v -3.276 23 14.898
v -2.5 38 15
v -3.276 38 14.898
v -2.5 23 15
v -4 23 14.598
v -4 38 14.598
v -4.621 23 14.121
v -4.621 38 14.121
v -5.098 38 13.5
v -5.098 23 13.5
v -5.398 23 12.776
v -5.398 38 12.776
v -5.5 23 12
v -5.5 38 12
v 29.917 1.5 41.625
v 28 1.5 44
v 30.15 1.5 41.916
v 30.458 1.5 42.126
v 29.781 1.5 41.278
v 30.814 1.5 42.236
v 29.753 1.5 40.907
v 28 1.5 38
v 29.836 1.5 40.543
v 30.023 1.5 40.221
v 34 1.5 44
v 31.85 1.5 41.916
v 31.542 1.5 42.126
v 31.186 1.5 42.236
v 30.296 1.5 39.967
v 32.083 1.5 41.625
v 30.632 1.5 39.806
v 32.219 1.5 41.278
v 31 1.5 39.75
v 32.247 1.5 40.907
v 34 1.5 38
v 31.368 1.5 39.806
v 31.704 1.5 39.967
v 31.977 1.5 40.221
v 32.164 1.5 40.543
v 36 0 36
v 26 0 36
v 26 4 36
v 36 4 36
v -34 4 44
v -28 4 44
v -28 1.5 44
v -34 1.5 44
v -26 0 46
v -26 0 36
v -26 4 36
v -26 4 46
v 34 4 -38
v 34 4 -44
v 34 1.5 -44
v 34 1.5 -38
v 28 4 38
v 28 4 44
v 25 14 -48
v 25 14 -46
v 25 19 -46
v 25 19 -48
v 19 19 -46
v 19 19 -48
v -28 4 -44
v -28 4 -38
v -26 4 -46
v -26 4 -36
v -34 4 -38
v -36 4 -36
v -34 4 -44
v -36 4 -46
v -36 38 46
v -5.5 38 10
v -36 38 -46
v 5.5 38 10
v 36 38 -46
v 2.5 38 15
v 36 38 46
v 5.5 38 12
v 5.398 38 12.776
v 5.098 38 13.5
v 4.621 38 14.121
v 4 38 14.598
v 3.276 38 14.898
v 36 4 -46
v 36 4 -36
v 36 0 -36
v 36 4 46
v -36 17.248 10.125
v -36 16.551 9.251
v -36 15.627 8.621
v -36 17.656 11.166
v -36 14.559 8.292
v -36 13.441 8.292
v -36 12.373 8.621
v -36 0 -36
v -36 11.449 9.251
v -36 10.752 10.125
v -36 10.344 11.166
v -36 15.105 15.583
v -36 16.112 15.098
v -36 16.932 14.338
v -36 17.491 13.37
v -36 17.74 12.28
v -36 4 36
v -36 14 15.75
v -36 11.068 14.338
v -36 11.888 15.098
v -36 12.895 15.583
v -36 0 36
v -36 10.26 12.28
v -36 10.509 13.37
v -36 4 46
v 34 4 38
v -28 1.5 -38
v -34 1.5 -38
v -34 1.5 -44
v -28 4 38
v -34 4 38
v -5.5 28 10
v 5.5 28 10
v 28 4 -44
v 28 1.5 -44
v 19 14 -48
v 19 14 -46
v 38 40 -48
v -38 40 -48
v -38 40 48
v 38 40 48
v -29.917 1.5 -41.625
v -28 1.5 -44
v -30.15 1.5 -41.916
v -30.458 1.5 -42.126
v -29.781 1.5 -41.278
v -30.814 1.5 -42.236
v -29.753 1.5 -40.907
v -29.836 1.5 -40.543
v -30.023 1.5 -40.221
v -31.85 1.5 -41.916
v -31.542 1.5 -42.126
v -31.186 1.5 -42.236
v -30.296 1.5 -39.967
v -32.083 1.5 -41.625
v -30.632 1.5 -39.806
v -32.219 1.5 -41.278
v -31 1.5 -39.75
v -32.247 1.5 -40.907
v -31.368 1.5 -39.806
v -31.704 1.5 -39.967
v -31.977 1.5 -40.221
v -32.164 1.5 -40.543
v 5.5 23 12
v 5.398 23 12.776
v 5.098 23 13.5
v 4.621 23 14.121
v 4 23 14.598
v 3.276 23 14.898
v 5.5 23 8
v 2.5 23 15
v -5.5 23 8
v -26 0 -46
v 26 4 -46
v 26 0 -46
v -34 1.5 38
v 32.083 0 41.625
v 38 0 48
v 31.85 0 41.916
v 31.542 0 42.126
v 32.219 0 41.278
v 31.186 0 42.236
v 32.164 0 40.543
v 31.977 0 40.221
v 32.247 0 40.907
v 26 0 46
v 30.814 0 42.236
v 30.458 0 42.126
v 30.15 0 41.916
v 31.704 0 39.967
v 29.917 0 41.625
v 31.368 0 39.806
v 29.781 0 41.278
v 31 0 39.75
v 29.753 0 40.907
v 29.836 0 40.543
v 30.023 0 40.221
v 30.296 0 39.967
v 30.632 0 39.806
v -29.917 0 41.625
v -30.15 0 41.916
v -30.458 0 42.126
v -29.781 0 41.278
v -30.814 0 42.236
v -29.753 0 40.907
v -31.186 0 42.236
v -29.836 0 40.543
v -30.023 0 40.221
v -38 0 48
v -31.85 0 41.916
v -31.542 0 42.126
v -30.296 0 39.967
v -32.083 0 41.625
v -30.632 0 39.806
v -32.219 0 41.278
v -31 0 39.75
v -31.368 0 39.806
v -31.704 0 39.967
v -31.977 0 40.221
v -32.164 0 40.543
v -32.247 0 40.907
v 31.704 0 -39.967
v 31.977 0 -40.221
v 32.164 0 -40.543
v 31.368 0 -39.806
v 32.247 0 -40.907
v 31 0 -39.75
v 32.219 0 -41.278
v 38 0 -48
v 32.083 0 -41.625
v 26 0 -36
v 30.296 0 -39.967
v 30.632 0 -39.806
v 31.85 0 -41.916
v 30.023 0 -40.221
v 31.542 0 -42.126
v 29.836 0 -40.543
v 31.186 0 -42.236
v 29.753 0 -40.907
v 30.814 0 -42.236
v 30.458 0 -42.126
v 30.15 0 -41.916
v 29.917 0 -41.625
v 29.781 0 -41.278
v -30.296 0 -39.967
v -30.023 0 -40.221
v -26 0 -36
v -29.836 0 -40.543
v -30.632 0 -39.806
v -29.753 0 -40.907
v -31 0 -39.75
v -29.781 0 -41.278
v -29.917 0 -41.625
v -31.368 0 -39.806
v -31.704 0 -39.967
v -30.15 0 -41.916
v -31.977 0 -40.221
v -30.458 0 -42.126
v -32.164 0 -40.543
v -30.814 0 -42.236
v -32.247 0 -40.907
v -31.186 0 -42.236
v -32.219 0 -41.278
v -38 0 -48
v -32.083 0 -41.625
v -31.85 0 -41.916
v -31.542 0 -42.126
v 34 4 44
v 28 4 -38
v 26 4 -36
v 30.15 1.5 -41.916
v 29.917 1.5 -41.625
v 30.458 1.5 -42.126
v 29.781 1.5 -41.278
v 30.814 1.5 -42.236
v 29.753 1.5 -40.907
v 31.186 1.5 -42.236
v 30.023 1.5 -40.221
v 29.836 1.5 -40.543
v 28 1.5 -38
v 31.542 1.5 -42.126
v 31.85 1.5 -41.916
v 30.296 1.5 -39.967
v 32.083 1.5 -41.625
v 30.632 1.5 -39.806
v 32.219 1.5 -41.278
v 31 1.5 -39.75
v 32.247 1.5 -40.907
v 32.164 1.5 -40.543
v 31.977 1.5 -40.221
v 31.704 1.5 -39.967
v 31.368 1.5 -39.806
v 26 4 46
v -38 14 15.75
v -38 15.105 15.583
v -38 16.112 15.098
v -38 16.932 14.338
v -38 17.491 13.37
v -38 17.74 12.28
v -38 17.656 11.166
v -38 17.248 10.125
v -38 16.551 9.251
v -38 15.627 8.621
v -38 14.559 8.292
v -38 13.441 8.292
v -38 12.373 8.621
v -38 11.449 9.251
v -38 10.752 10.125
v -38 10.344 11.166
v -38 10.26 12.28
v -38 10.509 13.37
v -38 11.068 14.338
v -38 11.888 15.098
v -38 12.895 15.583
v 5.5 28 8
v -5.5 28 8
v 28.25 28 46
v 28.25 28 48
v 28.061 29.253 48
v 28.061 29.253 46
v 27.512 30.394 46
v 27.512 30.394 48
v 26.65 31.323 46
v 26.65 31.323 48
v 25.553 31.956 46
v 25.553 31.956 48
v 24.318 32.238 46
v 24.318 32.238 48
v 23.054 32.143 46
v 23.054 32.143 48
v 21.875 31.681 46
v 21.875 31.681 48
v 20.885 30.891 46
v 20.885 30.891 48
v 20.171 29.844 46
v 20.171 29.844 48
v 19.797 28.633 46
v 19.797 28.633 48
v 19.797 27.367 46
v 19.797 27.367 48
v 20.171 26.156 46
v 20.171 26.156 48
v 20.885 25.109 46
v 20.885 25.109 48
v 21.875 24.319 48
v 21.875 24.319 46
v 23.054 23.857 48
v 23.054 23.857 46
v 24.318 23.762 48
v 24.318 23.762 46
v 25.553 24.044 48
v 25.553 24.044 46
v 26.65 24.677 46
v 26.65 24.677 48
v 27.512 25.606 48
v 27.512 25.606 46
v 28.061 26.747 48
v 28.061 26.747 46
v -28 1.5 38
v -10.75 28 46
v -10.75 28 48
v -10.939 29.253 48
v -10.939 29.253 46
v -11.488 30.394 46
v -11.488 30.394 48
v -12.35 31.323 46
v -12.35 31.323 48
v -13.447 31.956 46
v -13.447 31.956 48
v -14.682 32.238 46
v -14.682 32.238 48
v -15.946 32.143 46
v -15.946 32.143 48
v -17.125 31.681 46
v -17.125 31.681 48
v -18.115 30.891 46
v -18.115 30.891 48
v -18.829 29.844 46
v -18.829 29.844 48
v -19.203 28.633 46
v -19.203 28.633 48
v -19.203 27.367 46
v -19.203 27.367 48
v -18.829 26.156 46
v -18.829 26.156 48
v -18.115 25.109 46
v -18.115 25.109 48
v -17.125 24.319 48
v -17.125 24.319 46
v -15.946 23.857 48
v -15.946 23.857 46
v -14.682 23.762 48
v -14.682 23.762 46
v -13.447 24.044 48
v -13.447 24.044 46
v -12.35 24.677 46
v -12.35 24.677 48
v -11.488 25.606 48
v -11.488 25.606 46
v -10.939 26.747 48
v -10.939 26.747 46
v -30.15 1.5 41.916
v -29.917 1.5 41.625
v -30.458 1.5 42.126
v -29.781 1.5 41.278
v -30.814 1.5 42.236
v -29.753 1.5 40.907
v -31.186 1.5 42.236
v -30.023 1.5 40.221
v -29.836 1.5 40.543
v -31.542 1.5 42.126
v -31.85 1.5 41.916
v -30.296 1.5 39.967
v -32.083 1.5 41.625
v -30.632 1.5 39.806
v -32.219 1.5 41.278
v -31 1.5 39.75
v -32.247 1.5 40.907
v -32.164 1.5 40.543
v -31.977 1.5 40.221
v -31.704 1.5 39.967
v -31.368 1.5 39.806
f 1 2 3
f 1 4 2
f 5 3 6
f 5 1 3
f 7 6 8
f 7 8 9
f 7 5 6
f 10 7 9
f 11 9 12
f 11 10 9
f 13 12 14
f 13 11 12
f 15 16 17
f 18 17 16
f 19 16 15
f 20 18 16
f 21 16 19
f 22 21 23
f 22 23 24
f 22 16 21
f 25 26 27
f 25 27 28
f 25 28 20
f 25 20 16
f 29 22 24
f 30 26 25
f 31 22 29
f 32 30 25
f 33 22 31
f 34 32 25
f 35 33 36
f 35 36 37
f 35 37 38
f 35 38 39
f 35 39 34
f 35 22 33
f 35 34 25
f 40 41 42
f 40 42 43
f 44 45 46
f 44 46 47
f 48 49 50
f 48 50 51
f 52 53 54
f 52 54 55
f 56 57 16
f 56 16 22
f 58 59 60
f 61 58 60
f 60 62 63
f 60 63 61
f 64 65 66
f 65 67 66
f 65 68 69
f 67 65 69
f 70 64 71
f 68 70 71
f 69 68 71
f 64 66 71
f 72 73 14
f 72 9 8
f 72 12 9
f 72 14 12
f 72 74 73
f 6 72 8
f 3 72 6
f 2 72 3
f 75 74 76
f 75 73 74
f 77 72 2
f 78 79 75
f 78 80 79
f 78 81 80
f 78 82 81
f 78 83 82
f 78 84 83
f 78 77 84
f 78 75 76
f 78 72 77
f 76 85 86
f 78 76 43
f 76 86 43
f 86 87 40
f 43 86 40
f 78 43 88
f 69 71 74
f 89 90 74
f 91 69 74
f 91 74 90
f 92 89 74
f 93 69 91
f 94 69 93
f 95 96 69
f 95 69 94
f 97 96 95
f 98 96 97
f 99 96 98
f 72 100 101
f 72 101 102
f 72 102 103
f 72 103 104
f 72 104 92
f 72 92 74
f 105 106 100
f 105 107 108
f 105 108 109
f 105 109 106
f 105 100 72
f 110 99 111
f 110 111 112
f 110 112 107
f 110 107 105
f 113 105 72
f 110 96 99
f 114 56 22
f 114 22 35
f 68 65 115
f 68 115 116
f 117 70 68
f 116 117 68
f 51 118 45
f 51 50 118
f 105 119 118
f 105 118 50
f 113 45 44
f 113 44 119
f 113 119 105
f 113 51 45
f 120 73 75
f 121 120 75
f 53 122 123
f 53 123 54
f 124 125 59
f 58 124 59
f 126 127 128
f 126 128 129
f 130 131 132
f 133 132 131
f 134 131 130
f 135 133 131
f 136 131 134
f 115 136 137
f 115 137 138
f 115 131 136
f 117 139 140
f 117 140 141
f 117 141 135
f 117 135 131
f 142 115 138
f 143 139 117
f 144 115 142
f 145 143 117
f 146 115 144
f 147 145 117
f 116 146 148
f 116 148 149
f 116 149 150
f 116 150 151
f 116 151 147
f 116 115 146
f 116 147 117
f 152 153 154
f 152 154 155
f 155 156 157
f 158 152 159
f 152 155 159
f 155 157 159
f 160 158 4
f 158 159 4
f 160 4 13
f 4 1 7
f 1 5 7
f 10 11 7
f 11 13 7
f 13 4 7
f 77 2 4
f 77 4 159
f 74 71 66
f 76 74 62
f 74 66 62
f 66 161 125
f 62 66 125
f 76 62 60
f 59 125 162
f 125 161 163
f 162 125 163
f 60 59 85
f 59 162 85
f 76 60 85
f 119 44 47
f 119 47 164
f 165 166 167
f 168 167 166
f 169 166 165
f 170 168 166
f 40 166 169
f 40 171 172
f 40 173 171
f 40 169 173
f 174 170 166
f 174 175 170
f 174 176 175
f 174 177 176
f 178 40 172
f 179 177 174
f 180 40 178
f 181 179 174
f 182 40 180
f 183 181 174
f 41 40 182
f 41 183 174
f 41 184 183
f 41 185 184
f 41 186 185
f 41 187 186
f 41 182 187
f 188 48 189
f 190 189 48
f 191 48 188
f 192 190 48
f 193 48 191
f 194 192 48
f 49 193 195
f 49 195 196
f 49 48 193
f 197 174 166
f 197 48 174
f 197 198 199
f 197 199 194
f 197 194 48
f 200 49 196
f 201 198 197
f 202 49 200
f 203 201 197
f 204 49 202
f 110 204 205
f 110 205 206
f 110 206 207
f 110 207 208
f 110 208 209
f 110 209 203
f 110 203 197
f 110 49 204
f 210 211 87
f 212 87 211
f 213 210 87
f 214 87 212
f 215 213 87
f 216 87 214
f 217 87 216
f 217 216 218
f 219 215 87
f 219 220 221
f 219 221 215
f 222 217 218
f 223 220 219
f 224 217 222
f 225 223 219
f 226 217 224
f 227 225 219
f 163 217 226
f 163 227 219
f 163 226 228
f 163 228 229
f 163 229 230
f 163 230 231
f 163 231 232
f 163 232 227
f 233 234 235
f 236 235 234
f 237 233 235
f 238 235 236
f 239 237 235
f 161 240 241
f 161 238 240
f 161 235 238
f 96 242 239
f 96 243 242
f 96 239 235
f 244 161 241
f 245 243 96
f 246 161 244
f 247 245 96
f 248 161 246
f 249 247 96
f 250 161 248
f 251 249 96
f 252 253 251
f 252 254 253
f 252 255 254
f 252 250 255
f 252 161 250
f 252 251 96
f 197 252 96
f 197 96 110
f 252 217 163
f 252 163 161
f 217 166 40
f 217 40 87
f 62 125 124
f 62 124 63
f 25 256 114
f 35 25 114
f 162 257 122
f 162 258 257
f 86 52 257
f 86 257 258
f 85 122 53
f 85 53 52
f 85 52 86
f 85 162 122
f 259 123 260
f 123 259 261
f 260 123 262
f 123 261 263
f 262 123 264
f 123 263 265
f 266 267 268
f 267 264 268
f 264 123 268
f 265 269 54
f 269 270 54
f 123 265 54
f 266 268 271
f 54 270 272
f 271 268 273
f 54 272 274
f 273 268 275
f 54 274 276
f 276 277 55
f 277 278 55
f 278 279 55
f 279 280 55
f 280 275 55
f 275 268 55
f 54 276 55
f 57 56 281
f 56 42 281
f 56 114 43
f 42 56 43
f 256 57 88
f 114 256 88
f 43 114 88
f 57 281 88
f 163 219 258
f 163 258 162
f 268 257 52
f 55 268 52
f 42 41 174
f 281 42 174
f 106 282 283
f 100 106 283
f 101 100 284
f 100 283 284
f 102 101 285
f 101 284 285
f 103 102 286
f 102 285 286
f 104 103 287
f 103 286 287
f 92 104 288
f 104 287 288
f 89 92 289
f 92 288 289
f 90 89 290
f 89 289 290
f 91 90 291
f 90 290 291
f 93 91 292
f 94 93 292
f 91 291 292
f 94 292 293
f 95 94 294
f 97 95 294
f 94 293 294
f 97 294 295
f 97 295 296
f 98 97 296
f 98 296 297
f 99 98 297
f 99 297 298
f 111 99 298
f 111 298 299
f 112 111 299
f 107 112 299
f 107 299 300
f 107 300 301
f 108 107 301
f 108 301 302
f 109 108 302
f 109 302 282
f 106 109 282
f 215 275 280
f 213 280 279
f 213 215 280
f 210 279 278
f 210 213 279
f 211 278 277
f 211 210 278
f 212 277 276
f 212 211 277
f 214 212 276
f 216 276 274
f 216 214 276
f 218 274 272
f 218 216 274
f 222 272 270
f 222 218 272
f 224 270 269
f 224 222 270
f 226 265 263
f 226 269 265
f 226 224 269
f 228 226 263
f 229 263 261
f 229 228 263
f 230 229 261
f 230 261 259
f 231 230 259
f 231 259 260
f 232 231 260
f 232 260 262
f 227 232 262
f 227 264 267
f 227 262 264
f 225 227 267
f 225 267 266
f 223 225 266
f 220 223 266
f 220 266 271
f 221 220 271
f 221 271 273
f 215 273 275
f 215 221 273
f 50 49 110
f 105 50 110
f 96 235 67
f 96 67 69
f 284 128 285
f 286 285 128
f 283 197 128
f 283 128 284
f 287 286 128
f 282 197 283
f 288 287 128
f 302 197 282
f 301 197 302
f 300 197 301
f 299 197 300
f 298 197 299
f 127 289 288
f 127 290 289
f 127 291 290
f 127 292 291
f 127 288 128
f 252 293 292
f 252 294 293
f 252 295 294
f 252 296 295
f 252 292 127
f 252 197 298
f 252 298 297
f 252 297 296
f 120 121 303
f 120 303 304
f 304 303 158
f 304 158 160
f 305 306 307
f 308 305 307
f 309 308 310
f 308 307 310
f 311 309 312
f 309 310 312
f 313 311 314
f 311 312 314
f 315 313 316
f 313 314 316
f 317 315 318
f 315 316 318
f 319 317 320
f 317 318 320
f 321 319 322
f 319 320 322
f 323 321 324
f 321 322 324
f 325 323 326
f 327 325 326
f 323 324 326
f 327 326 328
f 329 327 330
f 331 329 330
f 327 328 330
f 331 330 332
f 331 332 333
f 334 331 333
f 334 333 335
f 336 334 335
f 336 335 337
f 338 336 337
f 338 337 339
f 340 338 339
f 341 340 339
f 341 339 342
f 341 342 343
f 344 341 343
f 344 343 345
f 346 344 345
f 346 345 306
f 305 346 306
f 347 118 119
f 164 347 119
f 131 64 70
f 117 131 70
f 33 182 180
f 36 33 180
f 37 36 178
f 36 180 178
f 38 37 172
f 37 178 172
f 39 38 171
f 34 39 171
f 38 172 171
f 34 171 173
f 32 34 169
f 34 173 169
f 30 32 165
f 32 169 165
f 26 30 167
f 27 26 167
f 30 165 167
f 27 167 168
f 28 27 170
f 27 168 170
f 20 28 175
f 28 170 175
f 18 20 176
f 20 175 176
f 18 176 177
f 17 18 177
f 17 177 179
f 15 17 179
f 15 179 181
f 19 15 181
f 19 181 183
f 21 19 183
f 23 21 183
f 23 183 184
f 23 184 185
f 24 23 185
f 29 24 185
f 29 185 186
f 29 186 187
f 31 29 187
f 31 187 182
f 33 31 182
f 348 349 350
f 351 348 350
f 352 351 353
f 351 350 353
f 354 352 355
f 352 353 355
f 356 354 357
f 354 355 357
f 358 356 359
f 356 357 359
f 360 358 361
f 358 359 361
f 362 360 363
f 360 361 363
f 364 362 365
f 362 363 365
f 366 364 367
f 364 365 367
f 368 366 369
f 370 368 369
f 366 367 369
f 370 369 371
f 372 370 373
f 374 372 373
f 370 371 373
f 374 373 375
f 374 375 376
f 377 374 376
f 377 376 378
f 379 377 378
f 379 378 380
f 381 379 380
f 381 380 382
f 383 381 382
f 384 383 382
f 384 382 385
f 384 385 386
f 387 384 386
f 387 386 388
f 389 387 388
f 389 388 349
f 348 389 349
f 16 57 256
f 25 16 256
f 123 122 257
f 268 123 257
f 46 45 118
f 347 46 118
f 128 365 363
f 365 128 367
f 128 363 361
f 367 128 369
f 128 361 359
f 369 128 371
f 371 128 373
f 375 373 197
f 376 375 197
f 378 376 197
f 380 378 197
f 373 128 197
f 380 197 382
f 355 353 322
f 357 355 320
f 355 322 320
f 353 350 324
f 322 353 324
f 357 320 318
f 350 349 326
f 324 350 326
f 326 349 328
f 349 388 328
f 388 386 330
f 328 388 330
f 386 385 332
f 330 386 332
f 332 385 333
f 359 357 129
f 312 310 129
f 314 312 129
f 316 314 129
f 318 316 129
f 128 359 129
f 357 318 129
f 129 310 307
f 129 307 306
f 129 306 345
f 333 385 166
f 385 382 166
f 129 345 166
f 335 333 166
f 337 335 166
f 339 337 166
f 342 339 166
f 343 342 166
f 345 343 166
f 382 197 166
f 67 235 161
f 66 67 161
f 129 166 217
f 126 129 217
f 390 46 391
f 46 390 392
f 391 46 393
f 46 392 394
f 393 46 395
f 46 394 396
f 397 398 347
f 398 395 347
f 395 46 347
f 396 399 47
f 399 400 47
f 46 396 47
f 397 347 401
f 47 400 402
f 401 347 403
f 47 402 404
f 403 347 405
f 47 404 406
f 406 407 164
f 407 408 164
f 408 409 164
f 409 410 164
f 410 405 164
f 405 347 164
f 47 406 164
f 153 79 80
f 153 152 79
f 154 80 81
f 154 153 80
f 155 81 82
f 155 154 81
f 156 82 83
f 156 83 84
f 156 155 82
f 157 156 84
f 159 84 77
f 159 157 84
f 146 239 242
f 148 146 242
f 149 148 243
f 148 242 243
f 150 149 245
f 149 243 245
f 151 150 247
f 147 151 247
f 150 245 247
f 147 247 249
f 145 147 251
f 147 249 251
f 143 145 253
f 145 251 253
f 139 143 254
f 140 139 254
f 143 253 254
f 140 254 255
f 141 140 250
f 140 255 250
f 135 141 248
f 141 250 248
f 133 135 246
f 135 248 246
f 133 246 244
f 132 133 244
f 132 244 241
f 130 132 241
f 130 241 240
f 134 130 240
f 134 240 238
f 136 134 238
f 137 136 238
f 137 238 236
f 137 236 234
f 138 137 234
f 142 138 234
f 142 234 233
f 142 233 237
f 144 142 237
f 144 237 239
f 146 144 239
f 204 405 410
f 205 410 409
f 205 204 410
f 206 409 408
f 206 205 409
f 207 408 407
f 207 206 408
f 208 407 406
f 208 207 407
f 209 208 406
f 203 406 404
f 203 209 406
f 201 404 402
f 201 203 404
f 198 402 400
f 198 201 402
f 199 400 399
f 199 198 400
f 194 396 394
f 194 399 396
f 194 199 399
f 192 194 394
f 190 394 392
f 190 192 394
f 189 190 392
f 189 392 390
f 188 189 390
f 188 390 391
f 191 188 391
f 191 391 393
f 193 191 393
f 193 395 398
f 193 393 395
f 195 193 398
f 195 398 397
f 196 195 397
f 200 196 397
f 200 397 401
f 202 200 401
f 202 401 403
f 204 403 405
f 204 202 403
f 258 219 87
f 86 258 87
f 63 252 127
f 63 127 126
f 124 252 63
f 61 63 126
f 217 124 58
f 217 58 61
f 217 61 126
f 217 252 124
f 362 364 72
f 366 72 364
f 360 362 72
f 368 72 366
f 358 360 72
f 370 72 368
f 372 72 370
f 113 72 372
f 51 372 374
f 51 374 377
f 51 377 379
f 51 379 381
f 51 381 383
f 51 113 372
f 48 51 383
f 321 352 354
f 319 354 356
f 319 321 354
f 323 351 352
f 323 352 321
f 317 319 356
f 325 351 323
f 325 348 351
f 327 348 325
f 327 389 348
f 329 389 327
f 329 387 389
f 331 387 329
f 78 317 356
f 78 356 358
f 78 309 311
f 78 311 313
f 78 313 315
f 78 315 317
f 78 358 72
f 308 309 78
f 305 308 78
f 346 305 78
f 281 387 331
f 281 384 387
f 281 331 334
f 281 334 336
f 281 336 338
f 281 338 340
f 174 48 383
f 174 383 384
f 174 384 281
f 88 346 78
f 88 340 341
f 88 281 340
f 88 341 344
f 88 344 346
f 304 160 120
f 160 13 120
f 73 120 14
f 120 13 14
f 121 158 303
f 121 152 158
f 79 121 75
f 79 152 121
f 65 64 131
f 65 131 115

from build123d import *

# Parameters (mm, degrees)
SKETCH1_W               = 76
SKETCH1_H               = 96
BOSS_EXTRUDE1_DEPTH     = 40
SKETCH2_W               = 72
SKETCH2_H               = 92
CUT_EXTRUDE3_DEPTH      = 38
CUT_EXTRUDE4_REACH      = 112.725
SKETCH7_R               = 4.25
SKETCH10_W              = 11
SKETCH10_H              = 5
BOSS_EXTRUDE2_DEPTH     = 15
FILLET2_R               = 3
CUT_EXTRUDE5_REACH      = 110.995
SKETCH11_W              = 6
SKETCH11_H              = 5
SKETCH12_W              = 11
SKETCH12_H              = 5
BOSS_EXTRUDE3_DEPTH     = 2
CUT_EXTRUDE6_REACH      = 100.387
SKETCH13_R              = 3.75
SKETCH15_W              = 10
SKETCH15_H              = 10
SKETCH15_R              = 1.25
BOSS_EXTRUDE4_DEPTH     = 4
MIRROR2_COPY_1_SKETCH_W = 10
MIRROR2_COPY_1_SKETCH_H = 10
MIRROR2_COPY_1_SKETCH_R = 1.25
MIRROR2_COPY_1_DEPTH    = 4
SKETCH17_W              = 6
SKETCH17_H              = 6
CUT_EXTRUDE7_DEPTH      = 2.5
MIRROR4_COPY_1_SKETCH_W = 6
MIRROR4_COPY_1_SKETCH_H = 6
MIRROR4_COPY_1_DEPTH    = 2.5


with BuildPart() as part:
    # Sketch1 → Boss-Extrude1 (new body)
    with BuildSketch(Plane(origin=(0, 0, 0), x_dir=(1, 0, 0), z_dir=(0, 1, 0))):
        Rectangle(SKETCH1_W, SKETCH1_H)
    extrude(amount=BOSS_EXTRUDE1_DEPTH)

    # Sketch2 → Cut-Extrude3 (cut)
    with BuildSketch(Plane.XZ):
        Rectangle(SKETCH2_W, SKETCH2_H)
    extrude(amount=-CUT_EXTRUDE3_DEPTH, mode=Mode.SUBTRACT)

    # Sketch7 → Cut-Extrude4 (cut, up to next)
    with BuildSketch(Plane.XY.offset(48), mode=Mode.PRIVATE) as cut_extrude4_sk1:
        with Locations((-15, 28)):
            Circle(SKETCH7_R)
    cut_extrude4_tool1 = extrude(cut_extrude4_sk1.sketch, amount=-CUT_EXTRUDE4_REACH, mode=Mode.PRIVATE) & part.part
    # Sketch7 → Cut-Extrude4 (cut, up to next)
    with BuildSketch(Plane.XY.offset(48), mode=Mode.PRIVATE) as cut_extrude4_sk2:
        with Locations((24, 28)):
            Circle(SKETCH7_R)
    cut_extrude4_tool2 = extrude(cut_extrude4_sk2.sketch, amount=-CUT_EXTRUDE4_REACH, mode=Mode.PRIVATE) & part.part
    add(cut_extrude4_tool1.solids().sort_by_distance((-15, 28, 48))[0], mode=Mode.SUBTRACT)
    add(cut_extrude4_tool2.solids().sort_by_distance((24, 28, 48))[0], mode=Mode.SUBTRACT)

    # Sketch10 → Boss-Extrude2 (add)
    with BuildSketch(Plane.XZ.offset(-38)):
        with Locations((0, 12.5)):
            Rectangle(SKETCH10_W, SKETCH10_H)
    extrude(amount=BOSS_EXTRUDE2_DEPTH)

    # Fillet2
    fillet2_edges = [part.edges().sort_by_distance(p)[0] for p in [
        (5.5, 30.5, 15),
        (-5.5, 30.5, 15),
    ]]
    fillet(fillet2_edges, radius=FILLET2_R)

    # Sketch11 → Cut-Extrude5 (cut, up to next)
    with BuildSketch(Plane.XY.offset(-46), mode=Mode.PRIVATE) as cut_extrude5_sk1:
        with Locations((22, 16.5)):
            Rectangle(SKETCH11_W, SKETCH11_H)
    cut_extrude5_tool1 = extrude(cut_extrude5_sk1.sketch, amount=-CUT_EXTRUDE5_REACH, mode=Mode.PRIVATE) & part.part
    add(cut_extrude5_tool1.solids().sort_by_distance((22, 16.5, -46))[0], mode=Mode.SUBTRACT)

    # Sketch12 → Boss-Extrude3 (add)
    with BuildSketch(Plane(origin=(0, 0, 10), x_dir=(-1, 0, 0), z_dir=(0, 0, -1))):
        with Locations((0, 25.5)):
            Rectangle(SKETCH12_W, SKETCH12_H)
    extrude(amount=BOSS_EXTRUDE3_DEPTH)

    # Sketch13 → Cut-Extrude6 (cut, up to next)
    with BuildSketch(Plane.ZY.offset(38), mode=Mode.PRIVATE) as cut_extrude6_sk1:
        with Locations((12, 14)):
            Circle(SKETCH13_R)
    cut_extrude6_tool1 = extrude(cut_extrude6_sk1.sketch, amount=-CUT_EXTRUDE6_REACH, mode=Mode.PRIVATE) & part.part
    add(cut_extrude6_tool1.solids().sort_by_distance((-38, 14, 12))[0], mode=Mode.SUBTRACT)

    # Sketch15 → Boss-Extrude4 (add)
    with BuildSketch(Plane.XZ):
        with Locations((31, 41)):
            Rectangle(SKETCH15_W, SKETCH15_H)
        with Locations(Location((31, 41, 0), (0, 0, 270))):
            Circle(SKETCH15_R, mode=Mode.SUBTRACT)
    boss_extrude4 = extrude(amount=-BOSS_EXTRUDE4_DEPTH)

    # Mirror1: Boss-Extrude4 across plane
    add(boss_extrude4.mirror(Plane(origin=(0, 0, 0), x_dir=(0, 0, 1), z_dir=(1, 0, 0))))

    # Mirror2: Boss-Extrude4 across plane
    add(boss_extrude4.mirror(Plane.XY))

    # Mirror2 copy 1 sketch → Mirror2 copy 1 (add)
    with BuildSketch(Plane(origin=(0, 0, 0), x_dir=(-1, 0, 0), z_dir=(0, -1, 0))):
        with Locations((31, 41)):
            Rectangle(MIRROR2_COPY_1_SKETCH_W, MIRROR2_COPY_1_SKETCH_H)
        with Locations(Location((31, 41, 0), (0, 0, 270))):
            Circle(MIRROR2_COPY_1_SKETCH_R, mode=Mode.SUBTRACT)
    extrude(amount=-MIRROR2_COPY_1_DEPTH)

    # Sketch17 → Cut-Extrude7 (cut)
    with BuildSketch(Plane(origin=(0, 4, 0), x_dir=(1, 0, 0), z_dir=(0, 1, 0))):
        with Locations((31, -41)):
            Rectangle(SKETCH17_W, SKETCH17_H)
    cut_extrude7 = extrude(amount=-CUT_EXTRUDE7_DEPTH, mode=Mode.SUBTRACT)

    # Mirror3: Cut-Extrude7 across plane
    add(cut_extrude7.mirror(Plane(origin=(0, 0, 0), x_dir=(0, 0, 1), z_dir=(1, 0, 0))), mode=Mode.SUBTRACT)

    # Mirror4: Cut-Extrude7 across plane
    add(cut_extrude7.mirror(Plane.XY), mode=Mode.SUBTRACT)

    # Mirror4 copy 1 sketch → Mirror4 copy 1 (cut)
    with BuildSketch(Plane(origin=(0, 4, 0), x_dir=(-1, 0, 0), z_dir=(0, 1, 0))):
        with Locations((31, -41)):
            Rectangle(MIRROR4_COPY_1_SKETCH_W, MIRROR4_COPY_1_SKETCH_H)
    extrude(amount=-MIRROR4_COPY_1_DEPTH, mode=Mode.SUBTRACT)


solid = part.part
